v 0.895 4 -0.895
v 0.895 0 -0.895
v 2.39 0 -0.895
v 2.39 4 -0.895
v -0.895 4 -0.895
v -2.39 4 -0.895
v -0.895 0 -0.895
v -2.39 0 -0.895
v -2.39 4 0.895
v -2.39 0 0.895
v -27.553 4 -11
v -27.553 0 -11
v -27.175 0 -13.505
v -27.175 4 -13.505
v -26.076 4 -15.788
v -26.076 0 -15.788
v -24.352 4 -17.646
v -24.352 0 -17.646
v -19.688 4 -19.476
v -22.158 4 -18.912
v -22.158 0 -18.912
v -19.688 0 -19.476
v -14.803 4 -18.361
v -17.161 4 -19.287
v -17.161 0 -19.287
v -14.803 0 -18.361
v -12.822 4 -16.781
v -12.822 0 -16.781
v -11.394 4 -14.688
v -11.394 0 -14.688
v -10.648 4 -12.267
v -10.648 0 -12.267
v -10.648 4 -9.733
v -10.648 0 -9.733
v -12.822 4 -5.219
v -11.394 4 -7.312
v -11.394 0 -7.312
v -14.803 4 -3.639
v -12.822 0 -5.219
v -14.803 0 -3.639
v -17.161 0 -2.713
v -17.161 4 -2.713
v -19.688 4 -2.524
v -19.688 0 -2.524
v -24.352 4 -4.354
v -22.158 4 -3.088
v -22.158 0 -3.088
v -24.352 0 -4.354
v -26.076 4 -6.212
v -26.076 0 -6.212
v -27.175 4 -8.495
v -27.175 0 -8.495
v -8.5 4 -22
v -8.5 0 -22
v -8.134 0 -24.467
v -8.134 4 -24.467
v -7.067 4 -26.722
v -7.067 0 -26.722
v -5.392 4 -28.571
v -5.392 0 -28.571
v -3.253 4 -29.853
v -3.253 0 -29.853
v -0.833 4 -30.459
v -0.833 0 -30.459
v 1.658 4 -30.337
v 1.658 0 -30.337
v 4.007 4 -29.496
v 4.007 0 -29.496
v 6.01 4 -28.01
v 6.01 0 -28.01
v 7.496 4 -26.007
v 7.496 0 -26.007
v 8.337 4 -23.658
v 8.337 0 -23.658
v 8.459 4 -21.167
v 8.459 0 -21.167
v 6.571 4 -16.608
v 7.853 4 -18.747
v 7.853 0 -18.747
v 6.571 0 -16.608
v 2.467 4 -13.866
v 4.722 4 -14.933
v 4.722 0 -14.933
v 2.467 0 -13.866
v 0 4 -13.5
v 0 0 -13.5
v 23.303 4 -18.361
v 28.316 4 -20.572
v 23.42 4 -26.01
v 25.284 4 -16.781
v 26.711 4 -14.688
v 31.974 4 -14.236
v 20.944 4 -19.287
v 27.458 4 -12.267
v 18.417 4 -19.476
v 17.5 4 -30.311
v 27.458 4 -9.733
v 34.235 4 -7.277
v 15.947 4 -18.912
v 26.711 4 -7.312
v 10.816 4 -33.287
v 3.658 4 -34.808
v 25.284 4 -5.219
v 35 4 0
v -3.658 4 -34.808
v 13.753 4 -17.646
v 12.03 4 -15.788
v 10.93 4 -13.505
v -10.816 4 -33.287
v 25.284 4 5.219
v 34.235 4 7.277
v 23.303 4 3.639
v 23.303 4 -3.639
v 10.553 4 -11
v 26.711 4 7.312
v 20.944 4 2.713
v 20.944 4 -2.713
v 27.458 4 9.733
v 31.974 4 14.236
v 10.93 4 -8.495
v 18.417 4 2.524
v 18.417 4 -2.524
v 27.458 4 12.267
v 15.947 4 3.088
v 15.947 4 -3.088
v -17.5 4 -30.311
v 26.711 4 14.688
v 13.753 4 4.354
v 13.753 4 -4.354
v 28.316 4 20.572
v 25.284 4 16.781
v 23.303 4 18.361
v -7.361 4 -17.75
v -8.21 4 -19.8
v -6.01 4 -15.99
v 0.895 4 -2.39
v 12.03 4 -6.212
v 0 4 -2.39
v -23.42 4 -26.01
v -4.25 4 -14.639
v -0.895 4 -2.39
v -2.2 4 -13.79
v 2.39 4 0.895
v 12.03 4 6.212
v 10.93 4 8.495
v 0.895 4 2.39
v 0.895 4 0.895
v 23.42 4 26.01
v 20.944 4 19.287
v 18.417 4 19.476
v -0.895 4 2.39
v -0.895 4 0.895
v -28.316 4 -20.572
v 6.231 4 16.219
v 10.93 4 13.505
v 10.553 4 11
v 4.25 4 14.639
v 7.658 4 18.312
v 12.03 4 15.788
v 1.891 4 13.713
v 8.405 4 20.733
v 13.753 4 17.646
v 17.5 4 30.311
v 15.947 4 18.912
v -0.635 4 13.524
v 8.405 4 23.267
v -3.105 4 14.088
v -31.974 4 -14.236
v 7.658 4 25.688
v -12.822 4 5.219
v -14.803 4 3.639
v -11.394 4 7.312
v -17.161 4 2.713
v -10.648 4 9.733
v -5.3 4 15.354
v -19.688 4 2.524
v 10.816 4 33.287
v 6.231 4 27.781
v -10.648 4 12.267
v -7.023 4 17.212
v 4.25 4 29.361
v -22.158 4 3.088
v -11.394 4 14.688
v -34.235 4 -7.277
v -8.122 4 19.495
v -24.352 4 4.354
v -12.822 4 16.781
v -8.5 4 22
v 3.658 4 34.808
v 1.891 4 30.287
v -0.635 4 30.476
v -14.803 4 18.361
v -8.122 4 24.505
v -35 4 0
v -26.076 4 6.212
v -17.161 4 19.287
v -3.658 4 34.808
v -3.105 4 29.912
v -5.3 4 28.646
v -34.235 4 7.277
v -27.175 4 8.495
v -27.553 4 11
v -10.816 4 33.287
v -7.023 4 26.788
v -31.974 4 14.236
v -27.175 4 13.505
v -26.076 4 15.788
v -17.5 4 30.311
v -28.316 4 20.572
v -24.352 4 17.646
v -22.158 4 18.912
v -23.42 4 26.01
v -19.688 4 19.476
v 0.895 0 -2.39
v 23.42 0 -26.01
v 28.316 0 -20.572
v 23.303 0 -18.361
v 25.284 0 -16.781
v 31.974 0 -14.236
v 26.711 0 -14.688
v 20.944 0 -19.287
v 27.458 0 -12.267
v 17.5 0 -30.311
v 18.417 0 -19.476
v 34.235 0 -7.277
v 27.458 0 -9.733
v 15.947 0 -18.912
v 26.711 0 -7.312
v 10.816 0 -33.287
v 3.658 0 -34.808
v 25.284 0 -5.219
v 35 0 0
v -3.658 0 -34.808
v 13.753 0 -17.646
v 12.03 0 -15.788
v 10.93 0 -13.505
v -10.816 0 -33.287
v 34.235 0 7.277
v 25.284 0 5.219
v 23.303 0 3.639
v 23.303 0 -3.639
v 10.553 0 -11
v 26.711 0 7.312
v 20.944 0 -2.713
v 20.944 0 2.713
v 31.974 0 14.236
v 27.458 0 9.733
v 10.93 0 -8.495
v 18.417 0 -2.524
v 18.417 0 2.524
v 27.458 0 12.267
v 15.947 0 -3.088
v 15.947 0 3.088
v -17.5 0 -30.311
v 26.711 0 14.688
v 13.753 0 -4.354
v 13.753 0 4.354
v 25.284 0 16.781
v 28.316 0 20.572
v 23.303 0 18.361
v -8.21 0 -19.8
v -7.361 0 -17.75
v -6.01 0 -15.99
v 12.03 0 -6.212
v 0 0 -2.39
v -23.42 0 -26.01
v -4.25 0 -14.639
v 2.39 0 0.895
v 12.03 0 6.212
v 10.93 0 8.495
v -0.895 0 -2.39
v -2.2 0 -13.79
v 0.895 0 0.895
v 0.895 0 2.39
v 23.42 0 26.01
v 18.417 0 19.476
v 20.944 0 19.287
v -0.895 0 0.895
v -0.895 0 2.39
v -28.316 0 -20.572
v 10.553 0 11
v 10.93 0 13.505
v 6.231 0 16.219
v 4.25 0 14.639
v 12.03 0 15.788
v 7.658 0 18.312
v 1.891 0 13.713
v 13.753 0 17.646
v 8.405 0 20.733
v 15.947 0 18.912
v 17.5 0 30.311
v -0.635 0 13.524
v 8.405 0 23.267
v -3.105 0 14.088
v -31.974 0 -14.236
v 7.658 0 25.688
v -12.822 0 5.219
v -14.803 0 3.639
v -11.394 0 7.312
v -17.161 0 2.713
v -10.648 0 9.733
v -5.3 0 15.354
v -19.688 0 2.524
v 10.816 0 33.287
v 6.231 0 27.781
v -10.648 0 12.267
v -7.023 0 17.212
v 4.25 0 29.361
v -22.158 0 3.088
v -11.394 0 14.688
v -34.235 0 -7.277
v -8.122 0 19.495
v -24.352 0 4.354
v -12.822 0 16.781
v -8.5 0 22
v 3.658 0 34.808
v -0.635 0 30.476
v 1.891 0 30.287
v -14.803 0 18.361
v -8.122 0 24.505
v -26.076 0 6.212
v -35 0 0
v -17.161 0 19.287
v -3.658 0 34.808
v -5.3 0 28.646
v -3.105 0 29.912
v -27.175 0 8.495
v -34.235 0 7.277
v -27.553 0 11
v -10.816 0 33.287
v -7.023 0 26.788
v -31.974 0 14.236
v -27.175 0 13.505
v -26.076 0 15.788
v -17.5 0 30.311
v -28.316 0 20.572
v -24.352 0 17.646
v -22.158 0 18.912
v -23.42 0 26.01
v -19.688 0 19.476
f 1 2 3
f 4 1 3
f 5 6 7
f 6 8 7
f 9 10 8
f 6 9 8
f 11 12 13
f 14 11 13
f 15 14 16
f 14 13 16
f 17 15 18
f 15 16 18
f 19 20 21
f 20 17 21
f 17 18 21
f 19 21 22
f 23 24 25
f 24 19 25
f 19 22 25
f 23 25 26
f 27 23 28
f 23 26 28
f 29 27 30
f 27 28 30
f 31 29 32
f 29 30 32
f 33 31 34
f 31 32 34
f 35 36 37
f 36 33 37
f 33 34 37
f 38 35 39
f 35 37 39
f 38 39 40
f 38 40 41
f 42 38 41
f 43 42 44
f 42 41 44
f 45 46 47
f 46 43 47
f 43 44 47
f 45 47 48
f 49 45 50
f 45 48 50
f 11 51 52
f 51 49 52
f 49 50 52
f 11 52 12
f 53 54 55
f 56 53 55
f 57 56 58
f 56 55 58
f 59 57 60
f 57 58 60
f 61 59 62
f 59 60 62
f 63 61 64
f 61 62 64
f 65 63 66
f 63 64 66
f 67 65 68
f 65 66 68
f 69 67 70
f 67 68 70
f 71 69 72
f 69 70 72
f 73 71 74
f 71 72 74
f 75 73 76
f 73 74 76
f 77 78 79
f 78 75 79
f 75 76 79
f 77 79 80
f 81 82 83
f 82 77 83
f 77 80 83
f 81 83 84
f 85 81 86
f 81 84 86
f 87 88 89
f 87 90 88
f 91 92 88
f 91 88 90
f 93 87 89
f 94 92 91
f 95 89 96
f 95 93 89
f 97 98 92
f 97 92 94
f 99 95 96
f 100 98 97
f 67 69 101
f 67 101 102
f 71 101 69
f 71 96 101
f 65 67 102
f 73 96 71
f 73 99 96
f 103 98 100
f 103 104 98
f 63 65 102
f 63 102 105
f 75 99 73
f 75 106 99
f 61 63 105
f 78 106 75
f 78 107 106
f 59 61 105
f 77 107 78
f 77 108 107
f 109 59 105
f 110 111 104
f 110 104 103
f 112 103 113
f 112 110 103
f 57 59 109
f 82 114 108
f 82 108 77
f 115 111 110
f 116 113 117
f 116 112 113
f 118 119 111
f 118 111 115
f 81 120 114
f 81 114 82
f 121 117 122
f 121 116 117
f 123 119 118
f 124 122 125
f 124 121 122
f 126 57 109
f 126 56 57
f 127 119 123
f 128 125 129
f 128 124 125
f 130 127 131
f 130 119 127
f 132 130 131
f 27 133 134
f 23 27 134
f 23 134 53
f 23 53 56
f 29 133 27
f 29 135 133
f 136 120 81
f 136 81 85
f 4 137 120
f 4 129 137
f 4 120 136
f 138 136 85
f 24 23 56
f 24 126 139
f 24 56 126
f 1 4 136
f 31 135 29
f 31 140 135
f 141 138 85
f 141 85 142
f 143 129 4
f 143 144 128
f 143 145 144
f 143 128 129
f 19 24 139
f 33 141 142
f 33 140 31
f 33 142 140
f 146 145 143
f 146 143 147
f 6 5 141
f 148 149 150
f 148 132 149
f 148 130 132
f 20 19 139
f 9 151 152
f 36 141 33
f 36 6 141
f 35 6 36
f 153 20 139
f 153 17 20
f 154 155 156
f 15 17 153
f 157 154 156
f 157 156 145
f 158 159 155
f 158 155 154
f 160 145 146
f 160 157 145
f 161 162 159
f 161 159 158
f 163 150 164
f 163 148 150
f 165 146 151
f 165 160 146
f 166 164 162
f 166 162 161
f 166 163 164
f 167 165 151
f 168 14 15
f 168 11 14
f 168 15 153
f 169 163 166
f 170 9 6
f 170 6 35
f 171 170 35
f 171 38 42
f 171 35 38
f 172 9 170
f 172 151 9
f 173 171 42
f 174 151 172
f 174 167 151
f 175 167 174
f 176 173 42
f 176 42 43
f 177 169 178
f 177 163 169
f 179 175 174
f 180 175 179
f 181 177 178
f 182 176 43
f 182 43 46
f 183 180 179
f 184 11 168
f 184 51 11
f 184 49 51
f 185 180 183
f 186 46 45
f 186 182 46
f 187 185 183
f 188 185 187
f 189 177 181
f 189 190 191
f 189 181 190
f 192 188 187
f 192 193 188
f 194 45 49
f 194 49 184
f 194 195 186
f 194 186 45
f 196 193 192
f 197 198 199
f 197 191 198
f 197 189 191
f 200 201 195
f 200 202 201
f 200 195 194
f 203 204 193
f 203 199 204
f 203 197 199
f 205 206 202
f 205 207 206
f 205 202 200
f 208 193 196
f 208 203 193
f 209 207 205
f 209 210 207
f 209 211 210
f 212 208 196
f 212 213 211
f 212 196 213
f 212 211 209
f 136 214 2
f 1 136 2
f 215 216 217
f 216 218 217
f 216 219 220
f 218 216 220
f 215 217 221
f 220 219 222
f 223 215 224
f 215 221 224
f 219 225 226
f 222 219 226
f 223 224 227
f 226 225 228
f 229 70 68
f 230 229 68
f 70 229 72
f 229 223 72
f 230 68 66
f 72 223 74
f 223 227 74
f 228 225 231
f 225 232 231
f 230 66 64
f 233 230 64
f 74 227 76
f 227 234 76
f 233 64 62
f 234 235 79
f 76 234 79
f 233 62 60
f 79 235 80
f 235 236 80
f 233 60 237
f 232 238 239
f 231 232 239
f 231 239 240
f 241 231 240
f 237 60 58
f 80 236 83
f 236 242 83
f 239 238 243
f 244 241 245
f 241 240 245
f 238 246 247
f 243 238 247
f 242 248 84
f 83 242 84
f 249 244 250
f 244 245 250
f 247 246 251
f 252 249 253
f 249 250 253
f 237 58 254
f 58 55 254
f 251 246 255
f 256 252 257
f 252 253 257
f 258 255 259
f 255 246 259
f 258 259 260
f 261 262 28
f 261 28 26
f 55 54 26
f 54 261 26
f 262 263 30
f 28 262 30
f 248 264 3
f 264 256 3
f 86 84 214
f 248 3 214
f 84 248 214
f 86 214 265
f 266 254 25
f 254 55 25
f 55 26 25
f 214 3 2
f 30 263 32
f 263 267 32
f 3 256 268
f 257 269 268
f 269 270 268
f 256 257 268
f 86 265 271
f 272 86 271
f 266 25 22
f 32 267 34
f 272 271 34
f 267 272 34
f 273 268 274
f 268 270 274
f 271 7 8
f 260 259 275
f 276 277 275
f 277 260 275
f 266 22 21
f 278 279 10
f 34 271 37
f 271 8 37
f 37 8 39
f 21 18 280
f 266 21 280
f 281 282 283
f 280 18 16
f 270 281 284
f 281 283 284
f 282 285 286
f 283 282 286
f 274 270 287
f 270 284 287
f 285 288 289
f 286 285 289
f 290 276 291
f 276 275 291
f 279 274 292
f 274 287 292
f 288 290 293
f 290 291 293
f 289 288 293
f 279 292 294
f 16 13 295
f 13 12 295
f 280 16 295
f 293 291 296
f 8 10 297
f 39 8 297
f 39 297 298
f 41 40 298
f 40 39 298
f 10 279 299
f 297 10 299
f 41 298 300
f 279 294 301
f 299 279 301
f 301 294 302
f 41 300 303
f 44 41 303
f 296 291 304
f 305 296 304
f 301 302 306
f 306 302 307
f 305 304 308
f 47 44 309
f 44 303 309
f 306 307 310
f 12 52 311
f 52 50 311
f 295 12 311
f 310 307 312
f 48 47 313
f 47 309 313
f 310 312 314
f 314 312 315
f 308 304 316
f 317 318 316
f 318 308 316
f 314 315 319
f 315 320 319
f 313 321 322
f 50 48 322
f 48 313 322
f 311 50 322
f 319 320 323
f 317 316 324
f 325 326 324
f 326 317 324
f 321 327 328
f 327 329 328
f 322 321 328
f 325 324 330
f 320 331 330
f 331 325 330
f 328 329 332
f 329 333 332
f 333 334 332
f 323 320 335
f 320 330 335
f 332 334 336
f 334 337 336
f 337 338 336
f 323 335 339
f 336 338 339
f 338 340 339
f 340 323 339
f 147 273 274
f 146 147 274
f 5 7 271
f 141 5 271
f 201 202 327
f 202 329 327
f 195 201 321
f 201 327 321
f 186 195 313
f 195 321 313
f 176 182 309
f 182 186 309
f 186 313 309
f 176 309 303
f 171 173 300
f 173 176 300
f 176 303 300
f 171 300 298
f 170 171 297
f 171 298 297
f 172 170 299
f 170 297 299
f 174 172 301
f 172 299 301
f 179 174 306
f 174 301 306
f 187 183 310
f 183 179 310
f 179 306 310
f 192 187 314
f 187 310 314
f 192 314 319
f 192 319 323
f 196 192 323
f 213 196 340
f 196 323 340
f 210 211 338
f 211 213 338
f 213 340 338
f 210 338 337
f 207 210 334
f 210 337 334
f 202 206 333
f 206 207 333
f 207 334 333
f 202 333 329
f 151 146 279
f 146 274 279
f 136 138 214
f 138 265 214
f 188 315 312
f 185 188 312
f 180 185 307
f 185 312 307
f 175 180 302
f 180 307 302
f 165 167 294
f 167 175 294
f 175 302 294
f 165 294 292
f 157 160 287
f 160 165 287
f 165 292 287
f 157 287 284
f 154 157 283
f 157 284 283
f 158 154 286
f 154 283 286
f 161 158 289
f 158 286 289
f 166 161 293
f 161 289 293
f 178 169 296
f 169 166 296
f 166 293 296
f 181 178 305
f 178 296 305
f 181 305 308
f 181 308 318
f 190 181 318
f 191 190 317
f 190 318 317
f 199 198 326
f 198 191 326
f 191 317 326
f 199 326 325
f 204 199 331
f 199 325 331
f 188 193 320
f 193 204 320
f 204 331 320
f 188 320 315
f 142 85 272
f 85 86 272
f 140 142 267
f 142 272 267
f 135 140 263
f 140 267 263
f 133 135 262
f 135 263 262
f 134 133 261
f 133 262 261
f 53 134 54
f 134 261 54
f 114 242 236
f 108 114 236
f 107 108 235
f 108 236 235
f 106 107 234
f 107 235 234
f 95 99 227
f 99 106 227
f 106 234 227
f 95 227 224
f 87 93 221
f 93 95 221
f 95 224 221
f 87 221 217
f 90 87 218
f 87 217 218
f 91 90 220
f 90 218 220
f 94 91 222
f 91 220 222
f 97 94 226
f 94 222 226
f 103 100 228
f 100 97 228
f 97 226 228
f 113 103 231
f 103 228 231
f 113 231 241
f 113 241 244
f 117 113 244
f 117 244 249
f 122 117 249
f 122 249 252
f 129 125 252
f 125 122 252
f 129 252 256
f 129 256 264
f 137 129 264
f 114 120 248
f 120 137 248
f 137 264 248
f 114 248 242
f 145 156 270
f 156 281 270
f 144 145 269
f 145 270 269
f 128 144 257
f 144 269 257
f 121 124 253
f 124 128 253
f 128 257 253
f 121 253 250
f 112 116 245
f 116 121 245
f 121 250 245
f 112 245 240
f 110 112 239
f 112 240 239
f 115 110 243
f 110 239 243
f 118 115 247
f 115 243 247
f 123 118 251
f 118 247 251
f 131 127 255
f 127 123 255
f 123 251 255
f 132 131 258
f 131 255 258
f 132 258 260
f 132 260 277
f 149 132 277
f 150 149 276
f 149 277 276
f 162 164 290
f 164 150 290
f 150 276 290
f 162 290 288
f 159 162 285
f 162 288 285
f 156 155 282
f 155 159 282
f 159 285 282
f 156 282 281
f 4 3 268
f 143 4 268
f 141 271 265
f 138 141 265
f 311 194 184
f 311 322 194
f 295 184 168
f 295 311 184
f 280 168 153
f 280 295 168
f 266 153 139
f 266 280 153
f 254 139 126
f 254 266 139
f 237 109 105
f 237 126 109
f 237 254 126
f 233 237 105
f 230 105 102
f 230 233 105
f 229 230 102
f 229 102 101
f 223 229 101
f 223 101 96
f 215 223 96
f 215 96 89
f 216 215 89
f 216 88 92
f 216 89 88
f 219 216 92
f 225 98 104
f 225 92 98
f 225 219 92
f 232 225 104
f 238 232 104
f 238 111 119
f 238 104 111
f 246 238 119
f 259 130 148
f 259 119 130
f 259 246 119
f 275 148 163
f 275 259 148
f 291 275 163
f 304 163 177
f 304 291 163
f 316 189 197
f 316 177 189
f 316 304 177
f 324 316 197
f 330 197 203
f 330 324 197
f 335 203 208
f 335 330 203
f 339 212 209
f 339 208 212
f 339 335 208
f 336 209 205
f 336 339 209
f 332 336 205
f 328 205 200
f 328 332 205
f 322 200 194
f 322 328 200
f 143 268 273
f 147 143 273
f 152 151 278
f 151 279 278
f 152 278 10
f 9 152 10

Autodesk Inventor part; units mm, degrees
ref_plane "YZ Plane" through (0, 0, 0) normal (1, 0, 0) x (0, 1, 0)
ref_plane "XZ Plane" through (0, 0, 0) normal (0, 1, 0) x (-1, 0, 0)
ref_plane "XY Plane" through (0, 0, 0) normal (0, 0, 1) x (1, 0, 0)
sketch "Sketch1" plane through (0, 0, 0) normal (0, 1, 0) x (-1, 0, 0)
  circle A0 centre (0, 0) radius 35
  line L0 (0, 0) -> (0, -22)
  circle A1 centre (0, -22) radius 8.5
  circle A2 centre (-19.0526, -11) radius 8.5
  circle A3 centre (-19.0526, 11) radius 8.5
  circle A4 centre (0, 22) radius 8.5
  circle A5 centre (19.0526, 11) radius 8.5
  circle A6 centre (19.0526, -11) radius 8.5
  line L1 (-2.39, 0.895) -> (2.39, 0.895)
  line L2 (2.39, 0.895) -> (2.39, -0.895)
  line L3 (2.39, -0.895) -> (-2.39, -0.895)
  line L4 (-2.39, -0.895) -> (-2.39, 0.895)
  line L5 (-2.39, 0.895) -> (2.39, -0.895) construction
  line L6 (2.39, 0.895) -> (-2.39, -0.895) construction
  line L7 (-0.895, -2.39) -> (-0.895, 2.39)
  line L8 (0.895, -2.39) -> (-0.895, -2.39)
  line L9 (-0.895, 2.39) -> (0.895, 2.39)
  line L10 (0.895, 2.39) -> (0.895, -2.39)
  line L11 (-0.895, -2.39) -> (0.895, 2.39) construction
  line L12 (-0.895, 2.39) -> (0.895, -2.39) construction
  line L13 (2.39, -0.895) -> (-2.39, -0.895)
  line L14 (2.39, 0.895) -> (2.39, -0.895)
  line L15 (-2.39, -0.895) -> (-2.39, 0.895)
  line L16 (-2.39, 0.895) -> (2.39, 0.895)
  line L17 (2.39, -0.895) -> (-2.39, 0.895) construction
  line L18 (-2.39, -0.895) -> (2.39, 0.895) construction
  line L19 (0.895, 2.39) -> (0.895, -2.39)
  line L20 (-0.895, 2.39) -> (0.895, 2.39)
  line L21 (0.895, -2.39) -> (-0.895, -2.39)
  line L22 (-0.895, -2.39) -> (-0.895, 2.39)
  line L23 (0.895, 2.39) -> (-0.895, -2.39) construction
  line L24 (0.895, -2.39) -> (-0.895, 2.39) construction
  point P0 (-0.895, -0.895)
  point P1 (-0.895, 0.895)
  point P2 (0.895, 0.895)
  point P3 (0.895, -0.895)
  dimension "d0" = 70
  dimension "d1" = 22
  dimension "d2" = 17
  dimension "d5" = 360
  dimension "d9" = 4.78
  dimension "d10" = 1.79
  dimension "d13" = 360
extrude "Extrusion1" add sketch "Sketch1" along normal blind 4
properties part number "disc_mover"
